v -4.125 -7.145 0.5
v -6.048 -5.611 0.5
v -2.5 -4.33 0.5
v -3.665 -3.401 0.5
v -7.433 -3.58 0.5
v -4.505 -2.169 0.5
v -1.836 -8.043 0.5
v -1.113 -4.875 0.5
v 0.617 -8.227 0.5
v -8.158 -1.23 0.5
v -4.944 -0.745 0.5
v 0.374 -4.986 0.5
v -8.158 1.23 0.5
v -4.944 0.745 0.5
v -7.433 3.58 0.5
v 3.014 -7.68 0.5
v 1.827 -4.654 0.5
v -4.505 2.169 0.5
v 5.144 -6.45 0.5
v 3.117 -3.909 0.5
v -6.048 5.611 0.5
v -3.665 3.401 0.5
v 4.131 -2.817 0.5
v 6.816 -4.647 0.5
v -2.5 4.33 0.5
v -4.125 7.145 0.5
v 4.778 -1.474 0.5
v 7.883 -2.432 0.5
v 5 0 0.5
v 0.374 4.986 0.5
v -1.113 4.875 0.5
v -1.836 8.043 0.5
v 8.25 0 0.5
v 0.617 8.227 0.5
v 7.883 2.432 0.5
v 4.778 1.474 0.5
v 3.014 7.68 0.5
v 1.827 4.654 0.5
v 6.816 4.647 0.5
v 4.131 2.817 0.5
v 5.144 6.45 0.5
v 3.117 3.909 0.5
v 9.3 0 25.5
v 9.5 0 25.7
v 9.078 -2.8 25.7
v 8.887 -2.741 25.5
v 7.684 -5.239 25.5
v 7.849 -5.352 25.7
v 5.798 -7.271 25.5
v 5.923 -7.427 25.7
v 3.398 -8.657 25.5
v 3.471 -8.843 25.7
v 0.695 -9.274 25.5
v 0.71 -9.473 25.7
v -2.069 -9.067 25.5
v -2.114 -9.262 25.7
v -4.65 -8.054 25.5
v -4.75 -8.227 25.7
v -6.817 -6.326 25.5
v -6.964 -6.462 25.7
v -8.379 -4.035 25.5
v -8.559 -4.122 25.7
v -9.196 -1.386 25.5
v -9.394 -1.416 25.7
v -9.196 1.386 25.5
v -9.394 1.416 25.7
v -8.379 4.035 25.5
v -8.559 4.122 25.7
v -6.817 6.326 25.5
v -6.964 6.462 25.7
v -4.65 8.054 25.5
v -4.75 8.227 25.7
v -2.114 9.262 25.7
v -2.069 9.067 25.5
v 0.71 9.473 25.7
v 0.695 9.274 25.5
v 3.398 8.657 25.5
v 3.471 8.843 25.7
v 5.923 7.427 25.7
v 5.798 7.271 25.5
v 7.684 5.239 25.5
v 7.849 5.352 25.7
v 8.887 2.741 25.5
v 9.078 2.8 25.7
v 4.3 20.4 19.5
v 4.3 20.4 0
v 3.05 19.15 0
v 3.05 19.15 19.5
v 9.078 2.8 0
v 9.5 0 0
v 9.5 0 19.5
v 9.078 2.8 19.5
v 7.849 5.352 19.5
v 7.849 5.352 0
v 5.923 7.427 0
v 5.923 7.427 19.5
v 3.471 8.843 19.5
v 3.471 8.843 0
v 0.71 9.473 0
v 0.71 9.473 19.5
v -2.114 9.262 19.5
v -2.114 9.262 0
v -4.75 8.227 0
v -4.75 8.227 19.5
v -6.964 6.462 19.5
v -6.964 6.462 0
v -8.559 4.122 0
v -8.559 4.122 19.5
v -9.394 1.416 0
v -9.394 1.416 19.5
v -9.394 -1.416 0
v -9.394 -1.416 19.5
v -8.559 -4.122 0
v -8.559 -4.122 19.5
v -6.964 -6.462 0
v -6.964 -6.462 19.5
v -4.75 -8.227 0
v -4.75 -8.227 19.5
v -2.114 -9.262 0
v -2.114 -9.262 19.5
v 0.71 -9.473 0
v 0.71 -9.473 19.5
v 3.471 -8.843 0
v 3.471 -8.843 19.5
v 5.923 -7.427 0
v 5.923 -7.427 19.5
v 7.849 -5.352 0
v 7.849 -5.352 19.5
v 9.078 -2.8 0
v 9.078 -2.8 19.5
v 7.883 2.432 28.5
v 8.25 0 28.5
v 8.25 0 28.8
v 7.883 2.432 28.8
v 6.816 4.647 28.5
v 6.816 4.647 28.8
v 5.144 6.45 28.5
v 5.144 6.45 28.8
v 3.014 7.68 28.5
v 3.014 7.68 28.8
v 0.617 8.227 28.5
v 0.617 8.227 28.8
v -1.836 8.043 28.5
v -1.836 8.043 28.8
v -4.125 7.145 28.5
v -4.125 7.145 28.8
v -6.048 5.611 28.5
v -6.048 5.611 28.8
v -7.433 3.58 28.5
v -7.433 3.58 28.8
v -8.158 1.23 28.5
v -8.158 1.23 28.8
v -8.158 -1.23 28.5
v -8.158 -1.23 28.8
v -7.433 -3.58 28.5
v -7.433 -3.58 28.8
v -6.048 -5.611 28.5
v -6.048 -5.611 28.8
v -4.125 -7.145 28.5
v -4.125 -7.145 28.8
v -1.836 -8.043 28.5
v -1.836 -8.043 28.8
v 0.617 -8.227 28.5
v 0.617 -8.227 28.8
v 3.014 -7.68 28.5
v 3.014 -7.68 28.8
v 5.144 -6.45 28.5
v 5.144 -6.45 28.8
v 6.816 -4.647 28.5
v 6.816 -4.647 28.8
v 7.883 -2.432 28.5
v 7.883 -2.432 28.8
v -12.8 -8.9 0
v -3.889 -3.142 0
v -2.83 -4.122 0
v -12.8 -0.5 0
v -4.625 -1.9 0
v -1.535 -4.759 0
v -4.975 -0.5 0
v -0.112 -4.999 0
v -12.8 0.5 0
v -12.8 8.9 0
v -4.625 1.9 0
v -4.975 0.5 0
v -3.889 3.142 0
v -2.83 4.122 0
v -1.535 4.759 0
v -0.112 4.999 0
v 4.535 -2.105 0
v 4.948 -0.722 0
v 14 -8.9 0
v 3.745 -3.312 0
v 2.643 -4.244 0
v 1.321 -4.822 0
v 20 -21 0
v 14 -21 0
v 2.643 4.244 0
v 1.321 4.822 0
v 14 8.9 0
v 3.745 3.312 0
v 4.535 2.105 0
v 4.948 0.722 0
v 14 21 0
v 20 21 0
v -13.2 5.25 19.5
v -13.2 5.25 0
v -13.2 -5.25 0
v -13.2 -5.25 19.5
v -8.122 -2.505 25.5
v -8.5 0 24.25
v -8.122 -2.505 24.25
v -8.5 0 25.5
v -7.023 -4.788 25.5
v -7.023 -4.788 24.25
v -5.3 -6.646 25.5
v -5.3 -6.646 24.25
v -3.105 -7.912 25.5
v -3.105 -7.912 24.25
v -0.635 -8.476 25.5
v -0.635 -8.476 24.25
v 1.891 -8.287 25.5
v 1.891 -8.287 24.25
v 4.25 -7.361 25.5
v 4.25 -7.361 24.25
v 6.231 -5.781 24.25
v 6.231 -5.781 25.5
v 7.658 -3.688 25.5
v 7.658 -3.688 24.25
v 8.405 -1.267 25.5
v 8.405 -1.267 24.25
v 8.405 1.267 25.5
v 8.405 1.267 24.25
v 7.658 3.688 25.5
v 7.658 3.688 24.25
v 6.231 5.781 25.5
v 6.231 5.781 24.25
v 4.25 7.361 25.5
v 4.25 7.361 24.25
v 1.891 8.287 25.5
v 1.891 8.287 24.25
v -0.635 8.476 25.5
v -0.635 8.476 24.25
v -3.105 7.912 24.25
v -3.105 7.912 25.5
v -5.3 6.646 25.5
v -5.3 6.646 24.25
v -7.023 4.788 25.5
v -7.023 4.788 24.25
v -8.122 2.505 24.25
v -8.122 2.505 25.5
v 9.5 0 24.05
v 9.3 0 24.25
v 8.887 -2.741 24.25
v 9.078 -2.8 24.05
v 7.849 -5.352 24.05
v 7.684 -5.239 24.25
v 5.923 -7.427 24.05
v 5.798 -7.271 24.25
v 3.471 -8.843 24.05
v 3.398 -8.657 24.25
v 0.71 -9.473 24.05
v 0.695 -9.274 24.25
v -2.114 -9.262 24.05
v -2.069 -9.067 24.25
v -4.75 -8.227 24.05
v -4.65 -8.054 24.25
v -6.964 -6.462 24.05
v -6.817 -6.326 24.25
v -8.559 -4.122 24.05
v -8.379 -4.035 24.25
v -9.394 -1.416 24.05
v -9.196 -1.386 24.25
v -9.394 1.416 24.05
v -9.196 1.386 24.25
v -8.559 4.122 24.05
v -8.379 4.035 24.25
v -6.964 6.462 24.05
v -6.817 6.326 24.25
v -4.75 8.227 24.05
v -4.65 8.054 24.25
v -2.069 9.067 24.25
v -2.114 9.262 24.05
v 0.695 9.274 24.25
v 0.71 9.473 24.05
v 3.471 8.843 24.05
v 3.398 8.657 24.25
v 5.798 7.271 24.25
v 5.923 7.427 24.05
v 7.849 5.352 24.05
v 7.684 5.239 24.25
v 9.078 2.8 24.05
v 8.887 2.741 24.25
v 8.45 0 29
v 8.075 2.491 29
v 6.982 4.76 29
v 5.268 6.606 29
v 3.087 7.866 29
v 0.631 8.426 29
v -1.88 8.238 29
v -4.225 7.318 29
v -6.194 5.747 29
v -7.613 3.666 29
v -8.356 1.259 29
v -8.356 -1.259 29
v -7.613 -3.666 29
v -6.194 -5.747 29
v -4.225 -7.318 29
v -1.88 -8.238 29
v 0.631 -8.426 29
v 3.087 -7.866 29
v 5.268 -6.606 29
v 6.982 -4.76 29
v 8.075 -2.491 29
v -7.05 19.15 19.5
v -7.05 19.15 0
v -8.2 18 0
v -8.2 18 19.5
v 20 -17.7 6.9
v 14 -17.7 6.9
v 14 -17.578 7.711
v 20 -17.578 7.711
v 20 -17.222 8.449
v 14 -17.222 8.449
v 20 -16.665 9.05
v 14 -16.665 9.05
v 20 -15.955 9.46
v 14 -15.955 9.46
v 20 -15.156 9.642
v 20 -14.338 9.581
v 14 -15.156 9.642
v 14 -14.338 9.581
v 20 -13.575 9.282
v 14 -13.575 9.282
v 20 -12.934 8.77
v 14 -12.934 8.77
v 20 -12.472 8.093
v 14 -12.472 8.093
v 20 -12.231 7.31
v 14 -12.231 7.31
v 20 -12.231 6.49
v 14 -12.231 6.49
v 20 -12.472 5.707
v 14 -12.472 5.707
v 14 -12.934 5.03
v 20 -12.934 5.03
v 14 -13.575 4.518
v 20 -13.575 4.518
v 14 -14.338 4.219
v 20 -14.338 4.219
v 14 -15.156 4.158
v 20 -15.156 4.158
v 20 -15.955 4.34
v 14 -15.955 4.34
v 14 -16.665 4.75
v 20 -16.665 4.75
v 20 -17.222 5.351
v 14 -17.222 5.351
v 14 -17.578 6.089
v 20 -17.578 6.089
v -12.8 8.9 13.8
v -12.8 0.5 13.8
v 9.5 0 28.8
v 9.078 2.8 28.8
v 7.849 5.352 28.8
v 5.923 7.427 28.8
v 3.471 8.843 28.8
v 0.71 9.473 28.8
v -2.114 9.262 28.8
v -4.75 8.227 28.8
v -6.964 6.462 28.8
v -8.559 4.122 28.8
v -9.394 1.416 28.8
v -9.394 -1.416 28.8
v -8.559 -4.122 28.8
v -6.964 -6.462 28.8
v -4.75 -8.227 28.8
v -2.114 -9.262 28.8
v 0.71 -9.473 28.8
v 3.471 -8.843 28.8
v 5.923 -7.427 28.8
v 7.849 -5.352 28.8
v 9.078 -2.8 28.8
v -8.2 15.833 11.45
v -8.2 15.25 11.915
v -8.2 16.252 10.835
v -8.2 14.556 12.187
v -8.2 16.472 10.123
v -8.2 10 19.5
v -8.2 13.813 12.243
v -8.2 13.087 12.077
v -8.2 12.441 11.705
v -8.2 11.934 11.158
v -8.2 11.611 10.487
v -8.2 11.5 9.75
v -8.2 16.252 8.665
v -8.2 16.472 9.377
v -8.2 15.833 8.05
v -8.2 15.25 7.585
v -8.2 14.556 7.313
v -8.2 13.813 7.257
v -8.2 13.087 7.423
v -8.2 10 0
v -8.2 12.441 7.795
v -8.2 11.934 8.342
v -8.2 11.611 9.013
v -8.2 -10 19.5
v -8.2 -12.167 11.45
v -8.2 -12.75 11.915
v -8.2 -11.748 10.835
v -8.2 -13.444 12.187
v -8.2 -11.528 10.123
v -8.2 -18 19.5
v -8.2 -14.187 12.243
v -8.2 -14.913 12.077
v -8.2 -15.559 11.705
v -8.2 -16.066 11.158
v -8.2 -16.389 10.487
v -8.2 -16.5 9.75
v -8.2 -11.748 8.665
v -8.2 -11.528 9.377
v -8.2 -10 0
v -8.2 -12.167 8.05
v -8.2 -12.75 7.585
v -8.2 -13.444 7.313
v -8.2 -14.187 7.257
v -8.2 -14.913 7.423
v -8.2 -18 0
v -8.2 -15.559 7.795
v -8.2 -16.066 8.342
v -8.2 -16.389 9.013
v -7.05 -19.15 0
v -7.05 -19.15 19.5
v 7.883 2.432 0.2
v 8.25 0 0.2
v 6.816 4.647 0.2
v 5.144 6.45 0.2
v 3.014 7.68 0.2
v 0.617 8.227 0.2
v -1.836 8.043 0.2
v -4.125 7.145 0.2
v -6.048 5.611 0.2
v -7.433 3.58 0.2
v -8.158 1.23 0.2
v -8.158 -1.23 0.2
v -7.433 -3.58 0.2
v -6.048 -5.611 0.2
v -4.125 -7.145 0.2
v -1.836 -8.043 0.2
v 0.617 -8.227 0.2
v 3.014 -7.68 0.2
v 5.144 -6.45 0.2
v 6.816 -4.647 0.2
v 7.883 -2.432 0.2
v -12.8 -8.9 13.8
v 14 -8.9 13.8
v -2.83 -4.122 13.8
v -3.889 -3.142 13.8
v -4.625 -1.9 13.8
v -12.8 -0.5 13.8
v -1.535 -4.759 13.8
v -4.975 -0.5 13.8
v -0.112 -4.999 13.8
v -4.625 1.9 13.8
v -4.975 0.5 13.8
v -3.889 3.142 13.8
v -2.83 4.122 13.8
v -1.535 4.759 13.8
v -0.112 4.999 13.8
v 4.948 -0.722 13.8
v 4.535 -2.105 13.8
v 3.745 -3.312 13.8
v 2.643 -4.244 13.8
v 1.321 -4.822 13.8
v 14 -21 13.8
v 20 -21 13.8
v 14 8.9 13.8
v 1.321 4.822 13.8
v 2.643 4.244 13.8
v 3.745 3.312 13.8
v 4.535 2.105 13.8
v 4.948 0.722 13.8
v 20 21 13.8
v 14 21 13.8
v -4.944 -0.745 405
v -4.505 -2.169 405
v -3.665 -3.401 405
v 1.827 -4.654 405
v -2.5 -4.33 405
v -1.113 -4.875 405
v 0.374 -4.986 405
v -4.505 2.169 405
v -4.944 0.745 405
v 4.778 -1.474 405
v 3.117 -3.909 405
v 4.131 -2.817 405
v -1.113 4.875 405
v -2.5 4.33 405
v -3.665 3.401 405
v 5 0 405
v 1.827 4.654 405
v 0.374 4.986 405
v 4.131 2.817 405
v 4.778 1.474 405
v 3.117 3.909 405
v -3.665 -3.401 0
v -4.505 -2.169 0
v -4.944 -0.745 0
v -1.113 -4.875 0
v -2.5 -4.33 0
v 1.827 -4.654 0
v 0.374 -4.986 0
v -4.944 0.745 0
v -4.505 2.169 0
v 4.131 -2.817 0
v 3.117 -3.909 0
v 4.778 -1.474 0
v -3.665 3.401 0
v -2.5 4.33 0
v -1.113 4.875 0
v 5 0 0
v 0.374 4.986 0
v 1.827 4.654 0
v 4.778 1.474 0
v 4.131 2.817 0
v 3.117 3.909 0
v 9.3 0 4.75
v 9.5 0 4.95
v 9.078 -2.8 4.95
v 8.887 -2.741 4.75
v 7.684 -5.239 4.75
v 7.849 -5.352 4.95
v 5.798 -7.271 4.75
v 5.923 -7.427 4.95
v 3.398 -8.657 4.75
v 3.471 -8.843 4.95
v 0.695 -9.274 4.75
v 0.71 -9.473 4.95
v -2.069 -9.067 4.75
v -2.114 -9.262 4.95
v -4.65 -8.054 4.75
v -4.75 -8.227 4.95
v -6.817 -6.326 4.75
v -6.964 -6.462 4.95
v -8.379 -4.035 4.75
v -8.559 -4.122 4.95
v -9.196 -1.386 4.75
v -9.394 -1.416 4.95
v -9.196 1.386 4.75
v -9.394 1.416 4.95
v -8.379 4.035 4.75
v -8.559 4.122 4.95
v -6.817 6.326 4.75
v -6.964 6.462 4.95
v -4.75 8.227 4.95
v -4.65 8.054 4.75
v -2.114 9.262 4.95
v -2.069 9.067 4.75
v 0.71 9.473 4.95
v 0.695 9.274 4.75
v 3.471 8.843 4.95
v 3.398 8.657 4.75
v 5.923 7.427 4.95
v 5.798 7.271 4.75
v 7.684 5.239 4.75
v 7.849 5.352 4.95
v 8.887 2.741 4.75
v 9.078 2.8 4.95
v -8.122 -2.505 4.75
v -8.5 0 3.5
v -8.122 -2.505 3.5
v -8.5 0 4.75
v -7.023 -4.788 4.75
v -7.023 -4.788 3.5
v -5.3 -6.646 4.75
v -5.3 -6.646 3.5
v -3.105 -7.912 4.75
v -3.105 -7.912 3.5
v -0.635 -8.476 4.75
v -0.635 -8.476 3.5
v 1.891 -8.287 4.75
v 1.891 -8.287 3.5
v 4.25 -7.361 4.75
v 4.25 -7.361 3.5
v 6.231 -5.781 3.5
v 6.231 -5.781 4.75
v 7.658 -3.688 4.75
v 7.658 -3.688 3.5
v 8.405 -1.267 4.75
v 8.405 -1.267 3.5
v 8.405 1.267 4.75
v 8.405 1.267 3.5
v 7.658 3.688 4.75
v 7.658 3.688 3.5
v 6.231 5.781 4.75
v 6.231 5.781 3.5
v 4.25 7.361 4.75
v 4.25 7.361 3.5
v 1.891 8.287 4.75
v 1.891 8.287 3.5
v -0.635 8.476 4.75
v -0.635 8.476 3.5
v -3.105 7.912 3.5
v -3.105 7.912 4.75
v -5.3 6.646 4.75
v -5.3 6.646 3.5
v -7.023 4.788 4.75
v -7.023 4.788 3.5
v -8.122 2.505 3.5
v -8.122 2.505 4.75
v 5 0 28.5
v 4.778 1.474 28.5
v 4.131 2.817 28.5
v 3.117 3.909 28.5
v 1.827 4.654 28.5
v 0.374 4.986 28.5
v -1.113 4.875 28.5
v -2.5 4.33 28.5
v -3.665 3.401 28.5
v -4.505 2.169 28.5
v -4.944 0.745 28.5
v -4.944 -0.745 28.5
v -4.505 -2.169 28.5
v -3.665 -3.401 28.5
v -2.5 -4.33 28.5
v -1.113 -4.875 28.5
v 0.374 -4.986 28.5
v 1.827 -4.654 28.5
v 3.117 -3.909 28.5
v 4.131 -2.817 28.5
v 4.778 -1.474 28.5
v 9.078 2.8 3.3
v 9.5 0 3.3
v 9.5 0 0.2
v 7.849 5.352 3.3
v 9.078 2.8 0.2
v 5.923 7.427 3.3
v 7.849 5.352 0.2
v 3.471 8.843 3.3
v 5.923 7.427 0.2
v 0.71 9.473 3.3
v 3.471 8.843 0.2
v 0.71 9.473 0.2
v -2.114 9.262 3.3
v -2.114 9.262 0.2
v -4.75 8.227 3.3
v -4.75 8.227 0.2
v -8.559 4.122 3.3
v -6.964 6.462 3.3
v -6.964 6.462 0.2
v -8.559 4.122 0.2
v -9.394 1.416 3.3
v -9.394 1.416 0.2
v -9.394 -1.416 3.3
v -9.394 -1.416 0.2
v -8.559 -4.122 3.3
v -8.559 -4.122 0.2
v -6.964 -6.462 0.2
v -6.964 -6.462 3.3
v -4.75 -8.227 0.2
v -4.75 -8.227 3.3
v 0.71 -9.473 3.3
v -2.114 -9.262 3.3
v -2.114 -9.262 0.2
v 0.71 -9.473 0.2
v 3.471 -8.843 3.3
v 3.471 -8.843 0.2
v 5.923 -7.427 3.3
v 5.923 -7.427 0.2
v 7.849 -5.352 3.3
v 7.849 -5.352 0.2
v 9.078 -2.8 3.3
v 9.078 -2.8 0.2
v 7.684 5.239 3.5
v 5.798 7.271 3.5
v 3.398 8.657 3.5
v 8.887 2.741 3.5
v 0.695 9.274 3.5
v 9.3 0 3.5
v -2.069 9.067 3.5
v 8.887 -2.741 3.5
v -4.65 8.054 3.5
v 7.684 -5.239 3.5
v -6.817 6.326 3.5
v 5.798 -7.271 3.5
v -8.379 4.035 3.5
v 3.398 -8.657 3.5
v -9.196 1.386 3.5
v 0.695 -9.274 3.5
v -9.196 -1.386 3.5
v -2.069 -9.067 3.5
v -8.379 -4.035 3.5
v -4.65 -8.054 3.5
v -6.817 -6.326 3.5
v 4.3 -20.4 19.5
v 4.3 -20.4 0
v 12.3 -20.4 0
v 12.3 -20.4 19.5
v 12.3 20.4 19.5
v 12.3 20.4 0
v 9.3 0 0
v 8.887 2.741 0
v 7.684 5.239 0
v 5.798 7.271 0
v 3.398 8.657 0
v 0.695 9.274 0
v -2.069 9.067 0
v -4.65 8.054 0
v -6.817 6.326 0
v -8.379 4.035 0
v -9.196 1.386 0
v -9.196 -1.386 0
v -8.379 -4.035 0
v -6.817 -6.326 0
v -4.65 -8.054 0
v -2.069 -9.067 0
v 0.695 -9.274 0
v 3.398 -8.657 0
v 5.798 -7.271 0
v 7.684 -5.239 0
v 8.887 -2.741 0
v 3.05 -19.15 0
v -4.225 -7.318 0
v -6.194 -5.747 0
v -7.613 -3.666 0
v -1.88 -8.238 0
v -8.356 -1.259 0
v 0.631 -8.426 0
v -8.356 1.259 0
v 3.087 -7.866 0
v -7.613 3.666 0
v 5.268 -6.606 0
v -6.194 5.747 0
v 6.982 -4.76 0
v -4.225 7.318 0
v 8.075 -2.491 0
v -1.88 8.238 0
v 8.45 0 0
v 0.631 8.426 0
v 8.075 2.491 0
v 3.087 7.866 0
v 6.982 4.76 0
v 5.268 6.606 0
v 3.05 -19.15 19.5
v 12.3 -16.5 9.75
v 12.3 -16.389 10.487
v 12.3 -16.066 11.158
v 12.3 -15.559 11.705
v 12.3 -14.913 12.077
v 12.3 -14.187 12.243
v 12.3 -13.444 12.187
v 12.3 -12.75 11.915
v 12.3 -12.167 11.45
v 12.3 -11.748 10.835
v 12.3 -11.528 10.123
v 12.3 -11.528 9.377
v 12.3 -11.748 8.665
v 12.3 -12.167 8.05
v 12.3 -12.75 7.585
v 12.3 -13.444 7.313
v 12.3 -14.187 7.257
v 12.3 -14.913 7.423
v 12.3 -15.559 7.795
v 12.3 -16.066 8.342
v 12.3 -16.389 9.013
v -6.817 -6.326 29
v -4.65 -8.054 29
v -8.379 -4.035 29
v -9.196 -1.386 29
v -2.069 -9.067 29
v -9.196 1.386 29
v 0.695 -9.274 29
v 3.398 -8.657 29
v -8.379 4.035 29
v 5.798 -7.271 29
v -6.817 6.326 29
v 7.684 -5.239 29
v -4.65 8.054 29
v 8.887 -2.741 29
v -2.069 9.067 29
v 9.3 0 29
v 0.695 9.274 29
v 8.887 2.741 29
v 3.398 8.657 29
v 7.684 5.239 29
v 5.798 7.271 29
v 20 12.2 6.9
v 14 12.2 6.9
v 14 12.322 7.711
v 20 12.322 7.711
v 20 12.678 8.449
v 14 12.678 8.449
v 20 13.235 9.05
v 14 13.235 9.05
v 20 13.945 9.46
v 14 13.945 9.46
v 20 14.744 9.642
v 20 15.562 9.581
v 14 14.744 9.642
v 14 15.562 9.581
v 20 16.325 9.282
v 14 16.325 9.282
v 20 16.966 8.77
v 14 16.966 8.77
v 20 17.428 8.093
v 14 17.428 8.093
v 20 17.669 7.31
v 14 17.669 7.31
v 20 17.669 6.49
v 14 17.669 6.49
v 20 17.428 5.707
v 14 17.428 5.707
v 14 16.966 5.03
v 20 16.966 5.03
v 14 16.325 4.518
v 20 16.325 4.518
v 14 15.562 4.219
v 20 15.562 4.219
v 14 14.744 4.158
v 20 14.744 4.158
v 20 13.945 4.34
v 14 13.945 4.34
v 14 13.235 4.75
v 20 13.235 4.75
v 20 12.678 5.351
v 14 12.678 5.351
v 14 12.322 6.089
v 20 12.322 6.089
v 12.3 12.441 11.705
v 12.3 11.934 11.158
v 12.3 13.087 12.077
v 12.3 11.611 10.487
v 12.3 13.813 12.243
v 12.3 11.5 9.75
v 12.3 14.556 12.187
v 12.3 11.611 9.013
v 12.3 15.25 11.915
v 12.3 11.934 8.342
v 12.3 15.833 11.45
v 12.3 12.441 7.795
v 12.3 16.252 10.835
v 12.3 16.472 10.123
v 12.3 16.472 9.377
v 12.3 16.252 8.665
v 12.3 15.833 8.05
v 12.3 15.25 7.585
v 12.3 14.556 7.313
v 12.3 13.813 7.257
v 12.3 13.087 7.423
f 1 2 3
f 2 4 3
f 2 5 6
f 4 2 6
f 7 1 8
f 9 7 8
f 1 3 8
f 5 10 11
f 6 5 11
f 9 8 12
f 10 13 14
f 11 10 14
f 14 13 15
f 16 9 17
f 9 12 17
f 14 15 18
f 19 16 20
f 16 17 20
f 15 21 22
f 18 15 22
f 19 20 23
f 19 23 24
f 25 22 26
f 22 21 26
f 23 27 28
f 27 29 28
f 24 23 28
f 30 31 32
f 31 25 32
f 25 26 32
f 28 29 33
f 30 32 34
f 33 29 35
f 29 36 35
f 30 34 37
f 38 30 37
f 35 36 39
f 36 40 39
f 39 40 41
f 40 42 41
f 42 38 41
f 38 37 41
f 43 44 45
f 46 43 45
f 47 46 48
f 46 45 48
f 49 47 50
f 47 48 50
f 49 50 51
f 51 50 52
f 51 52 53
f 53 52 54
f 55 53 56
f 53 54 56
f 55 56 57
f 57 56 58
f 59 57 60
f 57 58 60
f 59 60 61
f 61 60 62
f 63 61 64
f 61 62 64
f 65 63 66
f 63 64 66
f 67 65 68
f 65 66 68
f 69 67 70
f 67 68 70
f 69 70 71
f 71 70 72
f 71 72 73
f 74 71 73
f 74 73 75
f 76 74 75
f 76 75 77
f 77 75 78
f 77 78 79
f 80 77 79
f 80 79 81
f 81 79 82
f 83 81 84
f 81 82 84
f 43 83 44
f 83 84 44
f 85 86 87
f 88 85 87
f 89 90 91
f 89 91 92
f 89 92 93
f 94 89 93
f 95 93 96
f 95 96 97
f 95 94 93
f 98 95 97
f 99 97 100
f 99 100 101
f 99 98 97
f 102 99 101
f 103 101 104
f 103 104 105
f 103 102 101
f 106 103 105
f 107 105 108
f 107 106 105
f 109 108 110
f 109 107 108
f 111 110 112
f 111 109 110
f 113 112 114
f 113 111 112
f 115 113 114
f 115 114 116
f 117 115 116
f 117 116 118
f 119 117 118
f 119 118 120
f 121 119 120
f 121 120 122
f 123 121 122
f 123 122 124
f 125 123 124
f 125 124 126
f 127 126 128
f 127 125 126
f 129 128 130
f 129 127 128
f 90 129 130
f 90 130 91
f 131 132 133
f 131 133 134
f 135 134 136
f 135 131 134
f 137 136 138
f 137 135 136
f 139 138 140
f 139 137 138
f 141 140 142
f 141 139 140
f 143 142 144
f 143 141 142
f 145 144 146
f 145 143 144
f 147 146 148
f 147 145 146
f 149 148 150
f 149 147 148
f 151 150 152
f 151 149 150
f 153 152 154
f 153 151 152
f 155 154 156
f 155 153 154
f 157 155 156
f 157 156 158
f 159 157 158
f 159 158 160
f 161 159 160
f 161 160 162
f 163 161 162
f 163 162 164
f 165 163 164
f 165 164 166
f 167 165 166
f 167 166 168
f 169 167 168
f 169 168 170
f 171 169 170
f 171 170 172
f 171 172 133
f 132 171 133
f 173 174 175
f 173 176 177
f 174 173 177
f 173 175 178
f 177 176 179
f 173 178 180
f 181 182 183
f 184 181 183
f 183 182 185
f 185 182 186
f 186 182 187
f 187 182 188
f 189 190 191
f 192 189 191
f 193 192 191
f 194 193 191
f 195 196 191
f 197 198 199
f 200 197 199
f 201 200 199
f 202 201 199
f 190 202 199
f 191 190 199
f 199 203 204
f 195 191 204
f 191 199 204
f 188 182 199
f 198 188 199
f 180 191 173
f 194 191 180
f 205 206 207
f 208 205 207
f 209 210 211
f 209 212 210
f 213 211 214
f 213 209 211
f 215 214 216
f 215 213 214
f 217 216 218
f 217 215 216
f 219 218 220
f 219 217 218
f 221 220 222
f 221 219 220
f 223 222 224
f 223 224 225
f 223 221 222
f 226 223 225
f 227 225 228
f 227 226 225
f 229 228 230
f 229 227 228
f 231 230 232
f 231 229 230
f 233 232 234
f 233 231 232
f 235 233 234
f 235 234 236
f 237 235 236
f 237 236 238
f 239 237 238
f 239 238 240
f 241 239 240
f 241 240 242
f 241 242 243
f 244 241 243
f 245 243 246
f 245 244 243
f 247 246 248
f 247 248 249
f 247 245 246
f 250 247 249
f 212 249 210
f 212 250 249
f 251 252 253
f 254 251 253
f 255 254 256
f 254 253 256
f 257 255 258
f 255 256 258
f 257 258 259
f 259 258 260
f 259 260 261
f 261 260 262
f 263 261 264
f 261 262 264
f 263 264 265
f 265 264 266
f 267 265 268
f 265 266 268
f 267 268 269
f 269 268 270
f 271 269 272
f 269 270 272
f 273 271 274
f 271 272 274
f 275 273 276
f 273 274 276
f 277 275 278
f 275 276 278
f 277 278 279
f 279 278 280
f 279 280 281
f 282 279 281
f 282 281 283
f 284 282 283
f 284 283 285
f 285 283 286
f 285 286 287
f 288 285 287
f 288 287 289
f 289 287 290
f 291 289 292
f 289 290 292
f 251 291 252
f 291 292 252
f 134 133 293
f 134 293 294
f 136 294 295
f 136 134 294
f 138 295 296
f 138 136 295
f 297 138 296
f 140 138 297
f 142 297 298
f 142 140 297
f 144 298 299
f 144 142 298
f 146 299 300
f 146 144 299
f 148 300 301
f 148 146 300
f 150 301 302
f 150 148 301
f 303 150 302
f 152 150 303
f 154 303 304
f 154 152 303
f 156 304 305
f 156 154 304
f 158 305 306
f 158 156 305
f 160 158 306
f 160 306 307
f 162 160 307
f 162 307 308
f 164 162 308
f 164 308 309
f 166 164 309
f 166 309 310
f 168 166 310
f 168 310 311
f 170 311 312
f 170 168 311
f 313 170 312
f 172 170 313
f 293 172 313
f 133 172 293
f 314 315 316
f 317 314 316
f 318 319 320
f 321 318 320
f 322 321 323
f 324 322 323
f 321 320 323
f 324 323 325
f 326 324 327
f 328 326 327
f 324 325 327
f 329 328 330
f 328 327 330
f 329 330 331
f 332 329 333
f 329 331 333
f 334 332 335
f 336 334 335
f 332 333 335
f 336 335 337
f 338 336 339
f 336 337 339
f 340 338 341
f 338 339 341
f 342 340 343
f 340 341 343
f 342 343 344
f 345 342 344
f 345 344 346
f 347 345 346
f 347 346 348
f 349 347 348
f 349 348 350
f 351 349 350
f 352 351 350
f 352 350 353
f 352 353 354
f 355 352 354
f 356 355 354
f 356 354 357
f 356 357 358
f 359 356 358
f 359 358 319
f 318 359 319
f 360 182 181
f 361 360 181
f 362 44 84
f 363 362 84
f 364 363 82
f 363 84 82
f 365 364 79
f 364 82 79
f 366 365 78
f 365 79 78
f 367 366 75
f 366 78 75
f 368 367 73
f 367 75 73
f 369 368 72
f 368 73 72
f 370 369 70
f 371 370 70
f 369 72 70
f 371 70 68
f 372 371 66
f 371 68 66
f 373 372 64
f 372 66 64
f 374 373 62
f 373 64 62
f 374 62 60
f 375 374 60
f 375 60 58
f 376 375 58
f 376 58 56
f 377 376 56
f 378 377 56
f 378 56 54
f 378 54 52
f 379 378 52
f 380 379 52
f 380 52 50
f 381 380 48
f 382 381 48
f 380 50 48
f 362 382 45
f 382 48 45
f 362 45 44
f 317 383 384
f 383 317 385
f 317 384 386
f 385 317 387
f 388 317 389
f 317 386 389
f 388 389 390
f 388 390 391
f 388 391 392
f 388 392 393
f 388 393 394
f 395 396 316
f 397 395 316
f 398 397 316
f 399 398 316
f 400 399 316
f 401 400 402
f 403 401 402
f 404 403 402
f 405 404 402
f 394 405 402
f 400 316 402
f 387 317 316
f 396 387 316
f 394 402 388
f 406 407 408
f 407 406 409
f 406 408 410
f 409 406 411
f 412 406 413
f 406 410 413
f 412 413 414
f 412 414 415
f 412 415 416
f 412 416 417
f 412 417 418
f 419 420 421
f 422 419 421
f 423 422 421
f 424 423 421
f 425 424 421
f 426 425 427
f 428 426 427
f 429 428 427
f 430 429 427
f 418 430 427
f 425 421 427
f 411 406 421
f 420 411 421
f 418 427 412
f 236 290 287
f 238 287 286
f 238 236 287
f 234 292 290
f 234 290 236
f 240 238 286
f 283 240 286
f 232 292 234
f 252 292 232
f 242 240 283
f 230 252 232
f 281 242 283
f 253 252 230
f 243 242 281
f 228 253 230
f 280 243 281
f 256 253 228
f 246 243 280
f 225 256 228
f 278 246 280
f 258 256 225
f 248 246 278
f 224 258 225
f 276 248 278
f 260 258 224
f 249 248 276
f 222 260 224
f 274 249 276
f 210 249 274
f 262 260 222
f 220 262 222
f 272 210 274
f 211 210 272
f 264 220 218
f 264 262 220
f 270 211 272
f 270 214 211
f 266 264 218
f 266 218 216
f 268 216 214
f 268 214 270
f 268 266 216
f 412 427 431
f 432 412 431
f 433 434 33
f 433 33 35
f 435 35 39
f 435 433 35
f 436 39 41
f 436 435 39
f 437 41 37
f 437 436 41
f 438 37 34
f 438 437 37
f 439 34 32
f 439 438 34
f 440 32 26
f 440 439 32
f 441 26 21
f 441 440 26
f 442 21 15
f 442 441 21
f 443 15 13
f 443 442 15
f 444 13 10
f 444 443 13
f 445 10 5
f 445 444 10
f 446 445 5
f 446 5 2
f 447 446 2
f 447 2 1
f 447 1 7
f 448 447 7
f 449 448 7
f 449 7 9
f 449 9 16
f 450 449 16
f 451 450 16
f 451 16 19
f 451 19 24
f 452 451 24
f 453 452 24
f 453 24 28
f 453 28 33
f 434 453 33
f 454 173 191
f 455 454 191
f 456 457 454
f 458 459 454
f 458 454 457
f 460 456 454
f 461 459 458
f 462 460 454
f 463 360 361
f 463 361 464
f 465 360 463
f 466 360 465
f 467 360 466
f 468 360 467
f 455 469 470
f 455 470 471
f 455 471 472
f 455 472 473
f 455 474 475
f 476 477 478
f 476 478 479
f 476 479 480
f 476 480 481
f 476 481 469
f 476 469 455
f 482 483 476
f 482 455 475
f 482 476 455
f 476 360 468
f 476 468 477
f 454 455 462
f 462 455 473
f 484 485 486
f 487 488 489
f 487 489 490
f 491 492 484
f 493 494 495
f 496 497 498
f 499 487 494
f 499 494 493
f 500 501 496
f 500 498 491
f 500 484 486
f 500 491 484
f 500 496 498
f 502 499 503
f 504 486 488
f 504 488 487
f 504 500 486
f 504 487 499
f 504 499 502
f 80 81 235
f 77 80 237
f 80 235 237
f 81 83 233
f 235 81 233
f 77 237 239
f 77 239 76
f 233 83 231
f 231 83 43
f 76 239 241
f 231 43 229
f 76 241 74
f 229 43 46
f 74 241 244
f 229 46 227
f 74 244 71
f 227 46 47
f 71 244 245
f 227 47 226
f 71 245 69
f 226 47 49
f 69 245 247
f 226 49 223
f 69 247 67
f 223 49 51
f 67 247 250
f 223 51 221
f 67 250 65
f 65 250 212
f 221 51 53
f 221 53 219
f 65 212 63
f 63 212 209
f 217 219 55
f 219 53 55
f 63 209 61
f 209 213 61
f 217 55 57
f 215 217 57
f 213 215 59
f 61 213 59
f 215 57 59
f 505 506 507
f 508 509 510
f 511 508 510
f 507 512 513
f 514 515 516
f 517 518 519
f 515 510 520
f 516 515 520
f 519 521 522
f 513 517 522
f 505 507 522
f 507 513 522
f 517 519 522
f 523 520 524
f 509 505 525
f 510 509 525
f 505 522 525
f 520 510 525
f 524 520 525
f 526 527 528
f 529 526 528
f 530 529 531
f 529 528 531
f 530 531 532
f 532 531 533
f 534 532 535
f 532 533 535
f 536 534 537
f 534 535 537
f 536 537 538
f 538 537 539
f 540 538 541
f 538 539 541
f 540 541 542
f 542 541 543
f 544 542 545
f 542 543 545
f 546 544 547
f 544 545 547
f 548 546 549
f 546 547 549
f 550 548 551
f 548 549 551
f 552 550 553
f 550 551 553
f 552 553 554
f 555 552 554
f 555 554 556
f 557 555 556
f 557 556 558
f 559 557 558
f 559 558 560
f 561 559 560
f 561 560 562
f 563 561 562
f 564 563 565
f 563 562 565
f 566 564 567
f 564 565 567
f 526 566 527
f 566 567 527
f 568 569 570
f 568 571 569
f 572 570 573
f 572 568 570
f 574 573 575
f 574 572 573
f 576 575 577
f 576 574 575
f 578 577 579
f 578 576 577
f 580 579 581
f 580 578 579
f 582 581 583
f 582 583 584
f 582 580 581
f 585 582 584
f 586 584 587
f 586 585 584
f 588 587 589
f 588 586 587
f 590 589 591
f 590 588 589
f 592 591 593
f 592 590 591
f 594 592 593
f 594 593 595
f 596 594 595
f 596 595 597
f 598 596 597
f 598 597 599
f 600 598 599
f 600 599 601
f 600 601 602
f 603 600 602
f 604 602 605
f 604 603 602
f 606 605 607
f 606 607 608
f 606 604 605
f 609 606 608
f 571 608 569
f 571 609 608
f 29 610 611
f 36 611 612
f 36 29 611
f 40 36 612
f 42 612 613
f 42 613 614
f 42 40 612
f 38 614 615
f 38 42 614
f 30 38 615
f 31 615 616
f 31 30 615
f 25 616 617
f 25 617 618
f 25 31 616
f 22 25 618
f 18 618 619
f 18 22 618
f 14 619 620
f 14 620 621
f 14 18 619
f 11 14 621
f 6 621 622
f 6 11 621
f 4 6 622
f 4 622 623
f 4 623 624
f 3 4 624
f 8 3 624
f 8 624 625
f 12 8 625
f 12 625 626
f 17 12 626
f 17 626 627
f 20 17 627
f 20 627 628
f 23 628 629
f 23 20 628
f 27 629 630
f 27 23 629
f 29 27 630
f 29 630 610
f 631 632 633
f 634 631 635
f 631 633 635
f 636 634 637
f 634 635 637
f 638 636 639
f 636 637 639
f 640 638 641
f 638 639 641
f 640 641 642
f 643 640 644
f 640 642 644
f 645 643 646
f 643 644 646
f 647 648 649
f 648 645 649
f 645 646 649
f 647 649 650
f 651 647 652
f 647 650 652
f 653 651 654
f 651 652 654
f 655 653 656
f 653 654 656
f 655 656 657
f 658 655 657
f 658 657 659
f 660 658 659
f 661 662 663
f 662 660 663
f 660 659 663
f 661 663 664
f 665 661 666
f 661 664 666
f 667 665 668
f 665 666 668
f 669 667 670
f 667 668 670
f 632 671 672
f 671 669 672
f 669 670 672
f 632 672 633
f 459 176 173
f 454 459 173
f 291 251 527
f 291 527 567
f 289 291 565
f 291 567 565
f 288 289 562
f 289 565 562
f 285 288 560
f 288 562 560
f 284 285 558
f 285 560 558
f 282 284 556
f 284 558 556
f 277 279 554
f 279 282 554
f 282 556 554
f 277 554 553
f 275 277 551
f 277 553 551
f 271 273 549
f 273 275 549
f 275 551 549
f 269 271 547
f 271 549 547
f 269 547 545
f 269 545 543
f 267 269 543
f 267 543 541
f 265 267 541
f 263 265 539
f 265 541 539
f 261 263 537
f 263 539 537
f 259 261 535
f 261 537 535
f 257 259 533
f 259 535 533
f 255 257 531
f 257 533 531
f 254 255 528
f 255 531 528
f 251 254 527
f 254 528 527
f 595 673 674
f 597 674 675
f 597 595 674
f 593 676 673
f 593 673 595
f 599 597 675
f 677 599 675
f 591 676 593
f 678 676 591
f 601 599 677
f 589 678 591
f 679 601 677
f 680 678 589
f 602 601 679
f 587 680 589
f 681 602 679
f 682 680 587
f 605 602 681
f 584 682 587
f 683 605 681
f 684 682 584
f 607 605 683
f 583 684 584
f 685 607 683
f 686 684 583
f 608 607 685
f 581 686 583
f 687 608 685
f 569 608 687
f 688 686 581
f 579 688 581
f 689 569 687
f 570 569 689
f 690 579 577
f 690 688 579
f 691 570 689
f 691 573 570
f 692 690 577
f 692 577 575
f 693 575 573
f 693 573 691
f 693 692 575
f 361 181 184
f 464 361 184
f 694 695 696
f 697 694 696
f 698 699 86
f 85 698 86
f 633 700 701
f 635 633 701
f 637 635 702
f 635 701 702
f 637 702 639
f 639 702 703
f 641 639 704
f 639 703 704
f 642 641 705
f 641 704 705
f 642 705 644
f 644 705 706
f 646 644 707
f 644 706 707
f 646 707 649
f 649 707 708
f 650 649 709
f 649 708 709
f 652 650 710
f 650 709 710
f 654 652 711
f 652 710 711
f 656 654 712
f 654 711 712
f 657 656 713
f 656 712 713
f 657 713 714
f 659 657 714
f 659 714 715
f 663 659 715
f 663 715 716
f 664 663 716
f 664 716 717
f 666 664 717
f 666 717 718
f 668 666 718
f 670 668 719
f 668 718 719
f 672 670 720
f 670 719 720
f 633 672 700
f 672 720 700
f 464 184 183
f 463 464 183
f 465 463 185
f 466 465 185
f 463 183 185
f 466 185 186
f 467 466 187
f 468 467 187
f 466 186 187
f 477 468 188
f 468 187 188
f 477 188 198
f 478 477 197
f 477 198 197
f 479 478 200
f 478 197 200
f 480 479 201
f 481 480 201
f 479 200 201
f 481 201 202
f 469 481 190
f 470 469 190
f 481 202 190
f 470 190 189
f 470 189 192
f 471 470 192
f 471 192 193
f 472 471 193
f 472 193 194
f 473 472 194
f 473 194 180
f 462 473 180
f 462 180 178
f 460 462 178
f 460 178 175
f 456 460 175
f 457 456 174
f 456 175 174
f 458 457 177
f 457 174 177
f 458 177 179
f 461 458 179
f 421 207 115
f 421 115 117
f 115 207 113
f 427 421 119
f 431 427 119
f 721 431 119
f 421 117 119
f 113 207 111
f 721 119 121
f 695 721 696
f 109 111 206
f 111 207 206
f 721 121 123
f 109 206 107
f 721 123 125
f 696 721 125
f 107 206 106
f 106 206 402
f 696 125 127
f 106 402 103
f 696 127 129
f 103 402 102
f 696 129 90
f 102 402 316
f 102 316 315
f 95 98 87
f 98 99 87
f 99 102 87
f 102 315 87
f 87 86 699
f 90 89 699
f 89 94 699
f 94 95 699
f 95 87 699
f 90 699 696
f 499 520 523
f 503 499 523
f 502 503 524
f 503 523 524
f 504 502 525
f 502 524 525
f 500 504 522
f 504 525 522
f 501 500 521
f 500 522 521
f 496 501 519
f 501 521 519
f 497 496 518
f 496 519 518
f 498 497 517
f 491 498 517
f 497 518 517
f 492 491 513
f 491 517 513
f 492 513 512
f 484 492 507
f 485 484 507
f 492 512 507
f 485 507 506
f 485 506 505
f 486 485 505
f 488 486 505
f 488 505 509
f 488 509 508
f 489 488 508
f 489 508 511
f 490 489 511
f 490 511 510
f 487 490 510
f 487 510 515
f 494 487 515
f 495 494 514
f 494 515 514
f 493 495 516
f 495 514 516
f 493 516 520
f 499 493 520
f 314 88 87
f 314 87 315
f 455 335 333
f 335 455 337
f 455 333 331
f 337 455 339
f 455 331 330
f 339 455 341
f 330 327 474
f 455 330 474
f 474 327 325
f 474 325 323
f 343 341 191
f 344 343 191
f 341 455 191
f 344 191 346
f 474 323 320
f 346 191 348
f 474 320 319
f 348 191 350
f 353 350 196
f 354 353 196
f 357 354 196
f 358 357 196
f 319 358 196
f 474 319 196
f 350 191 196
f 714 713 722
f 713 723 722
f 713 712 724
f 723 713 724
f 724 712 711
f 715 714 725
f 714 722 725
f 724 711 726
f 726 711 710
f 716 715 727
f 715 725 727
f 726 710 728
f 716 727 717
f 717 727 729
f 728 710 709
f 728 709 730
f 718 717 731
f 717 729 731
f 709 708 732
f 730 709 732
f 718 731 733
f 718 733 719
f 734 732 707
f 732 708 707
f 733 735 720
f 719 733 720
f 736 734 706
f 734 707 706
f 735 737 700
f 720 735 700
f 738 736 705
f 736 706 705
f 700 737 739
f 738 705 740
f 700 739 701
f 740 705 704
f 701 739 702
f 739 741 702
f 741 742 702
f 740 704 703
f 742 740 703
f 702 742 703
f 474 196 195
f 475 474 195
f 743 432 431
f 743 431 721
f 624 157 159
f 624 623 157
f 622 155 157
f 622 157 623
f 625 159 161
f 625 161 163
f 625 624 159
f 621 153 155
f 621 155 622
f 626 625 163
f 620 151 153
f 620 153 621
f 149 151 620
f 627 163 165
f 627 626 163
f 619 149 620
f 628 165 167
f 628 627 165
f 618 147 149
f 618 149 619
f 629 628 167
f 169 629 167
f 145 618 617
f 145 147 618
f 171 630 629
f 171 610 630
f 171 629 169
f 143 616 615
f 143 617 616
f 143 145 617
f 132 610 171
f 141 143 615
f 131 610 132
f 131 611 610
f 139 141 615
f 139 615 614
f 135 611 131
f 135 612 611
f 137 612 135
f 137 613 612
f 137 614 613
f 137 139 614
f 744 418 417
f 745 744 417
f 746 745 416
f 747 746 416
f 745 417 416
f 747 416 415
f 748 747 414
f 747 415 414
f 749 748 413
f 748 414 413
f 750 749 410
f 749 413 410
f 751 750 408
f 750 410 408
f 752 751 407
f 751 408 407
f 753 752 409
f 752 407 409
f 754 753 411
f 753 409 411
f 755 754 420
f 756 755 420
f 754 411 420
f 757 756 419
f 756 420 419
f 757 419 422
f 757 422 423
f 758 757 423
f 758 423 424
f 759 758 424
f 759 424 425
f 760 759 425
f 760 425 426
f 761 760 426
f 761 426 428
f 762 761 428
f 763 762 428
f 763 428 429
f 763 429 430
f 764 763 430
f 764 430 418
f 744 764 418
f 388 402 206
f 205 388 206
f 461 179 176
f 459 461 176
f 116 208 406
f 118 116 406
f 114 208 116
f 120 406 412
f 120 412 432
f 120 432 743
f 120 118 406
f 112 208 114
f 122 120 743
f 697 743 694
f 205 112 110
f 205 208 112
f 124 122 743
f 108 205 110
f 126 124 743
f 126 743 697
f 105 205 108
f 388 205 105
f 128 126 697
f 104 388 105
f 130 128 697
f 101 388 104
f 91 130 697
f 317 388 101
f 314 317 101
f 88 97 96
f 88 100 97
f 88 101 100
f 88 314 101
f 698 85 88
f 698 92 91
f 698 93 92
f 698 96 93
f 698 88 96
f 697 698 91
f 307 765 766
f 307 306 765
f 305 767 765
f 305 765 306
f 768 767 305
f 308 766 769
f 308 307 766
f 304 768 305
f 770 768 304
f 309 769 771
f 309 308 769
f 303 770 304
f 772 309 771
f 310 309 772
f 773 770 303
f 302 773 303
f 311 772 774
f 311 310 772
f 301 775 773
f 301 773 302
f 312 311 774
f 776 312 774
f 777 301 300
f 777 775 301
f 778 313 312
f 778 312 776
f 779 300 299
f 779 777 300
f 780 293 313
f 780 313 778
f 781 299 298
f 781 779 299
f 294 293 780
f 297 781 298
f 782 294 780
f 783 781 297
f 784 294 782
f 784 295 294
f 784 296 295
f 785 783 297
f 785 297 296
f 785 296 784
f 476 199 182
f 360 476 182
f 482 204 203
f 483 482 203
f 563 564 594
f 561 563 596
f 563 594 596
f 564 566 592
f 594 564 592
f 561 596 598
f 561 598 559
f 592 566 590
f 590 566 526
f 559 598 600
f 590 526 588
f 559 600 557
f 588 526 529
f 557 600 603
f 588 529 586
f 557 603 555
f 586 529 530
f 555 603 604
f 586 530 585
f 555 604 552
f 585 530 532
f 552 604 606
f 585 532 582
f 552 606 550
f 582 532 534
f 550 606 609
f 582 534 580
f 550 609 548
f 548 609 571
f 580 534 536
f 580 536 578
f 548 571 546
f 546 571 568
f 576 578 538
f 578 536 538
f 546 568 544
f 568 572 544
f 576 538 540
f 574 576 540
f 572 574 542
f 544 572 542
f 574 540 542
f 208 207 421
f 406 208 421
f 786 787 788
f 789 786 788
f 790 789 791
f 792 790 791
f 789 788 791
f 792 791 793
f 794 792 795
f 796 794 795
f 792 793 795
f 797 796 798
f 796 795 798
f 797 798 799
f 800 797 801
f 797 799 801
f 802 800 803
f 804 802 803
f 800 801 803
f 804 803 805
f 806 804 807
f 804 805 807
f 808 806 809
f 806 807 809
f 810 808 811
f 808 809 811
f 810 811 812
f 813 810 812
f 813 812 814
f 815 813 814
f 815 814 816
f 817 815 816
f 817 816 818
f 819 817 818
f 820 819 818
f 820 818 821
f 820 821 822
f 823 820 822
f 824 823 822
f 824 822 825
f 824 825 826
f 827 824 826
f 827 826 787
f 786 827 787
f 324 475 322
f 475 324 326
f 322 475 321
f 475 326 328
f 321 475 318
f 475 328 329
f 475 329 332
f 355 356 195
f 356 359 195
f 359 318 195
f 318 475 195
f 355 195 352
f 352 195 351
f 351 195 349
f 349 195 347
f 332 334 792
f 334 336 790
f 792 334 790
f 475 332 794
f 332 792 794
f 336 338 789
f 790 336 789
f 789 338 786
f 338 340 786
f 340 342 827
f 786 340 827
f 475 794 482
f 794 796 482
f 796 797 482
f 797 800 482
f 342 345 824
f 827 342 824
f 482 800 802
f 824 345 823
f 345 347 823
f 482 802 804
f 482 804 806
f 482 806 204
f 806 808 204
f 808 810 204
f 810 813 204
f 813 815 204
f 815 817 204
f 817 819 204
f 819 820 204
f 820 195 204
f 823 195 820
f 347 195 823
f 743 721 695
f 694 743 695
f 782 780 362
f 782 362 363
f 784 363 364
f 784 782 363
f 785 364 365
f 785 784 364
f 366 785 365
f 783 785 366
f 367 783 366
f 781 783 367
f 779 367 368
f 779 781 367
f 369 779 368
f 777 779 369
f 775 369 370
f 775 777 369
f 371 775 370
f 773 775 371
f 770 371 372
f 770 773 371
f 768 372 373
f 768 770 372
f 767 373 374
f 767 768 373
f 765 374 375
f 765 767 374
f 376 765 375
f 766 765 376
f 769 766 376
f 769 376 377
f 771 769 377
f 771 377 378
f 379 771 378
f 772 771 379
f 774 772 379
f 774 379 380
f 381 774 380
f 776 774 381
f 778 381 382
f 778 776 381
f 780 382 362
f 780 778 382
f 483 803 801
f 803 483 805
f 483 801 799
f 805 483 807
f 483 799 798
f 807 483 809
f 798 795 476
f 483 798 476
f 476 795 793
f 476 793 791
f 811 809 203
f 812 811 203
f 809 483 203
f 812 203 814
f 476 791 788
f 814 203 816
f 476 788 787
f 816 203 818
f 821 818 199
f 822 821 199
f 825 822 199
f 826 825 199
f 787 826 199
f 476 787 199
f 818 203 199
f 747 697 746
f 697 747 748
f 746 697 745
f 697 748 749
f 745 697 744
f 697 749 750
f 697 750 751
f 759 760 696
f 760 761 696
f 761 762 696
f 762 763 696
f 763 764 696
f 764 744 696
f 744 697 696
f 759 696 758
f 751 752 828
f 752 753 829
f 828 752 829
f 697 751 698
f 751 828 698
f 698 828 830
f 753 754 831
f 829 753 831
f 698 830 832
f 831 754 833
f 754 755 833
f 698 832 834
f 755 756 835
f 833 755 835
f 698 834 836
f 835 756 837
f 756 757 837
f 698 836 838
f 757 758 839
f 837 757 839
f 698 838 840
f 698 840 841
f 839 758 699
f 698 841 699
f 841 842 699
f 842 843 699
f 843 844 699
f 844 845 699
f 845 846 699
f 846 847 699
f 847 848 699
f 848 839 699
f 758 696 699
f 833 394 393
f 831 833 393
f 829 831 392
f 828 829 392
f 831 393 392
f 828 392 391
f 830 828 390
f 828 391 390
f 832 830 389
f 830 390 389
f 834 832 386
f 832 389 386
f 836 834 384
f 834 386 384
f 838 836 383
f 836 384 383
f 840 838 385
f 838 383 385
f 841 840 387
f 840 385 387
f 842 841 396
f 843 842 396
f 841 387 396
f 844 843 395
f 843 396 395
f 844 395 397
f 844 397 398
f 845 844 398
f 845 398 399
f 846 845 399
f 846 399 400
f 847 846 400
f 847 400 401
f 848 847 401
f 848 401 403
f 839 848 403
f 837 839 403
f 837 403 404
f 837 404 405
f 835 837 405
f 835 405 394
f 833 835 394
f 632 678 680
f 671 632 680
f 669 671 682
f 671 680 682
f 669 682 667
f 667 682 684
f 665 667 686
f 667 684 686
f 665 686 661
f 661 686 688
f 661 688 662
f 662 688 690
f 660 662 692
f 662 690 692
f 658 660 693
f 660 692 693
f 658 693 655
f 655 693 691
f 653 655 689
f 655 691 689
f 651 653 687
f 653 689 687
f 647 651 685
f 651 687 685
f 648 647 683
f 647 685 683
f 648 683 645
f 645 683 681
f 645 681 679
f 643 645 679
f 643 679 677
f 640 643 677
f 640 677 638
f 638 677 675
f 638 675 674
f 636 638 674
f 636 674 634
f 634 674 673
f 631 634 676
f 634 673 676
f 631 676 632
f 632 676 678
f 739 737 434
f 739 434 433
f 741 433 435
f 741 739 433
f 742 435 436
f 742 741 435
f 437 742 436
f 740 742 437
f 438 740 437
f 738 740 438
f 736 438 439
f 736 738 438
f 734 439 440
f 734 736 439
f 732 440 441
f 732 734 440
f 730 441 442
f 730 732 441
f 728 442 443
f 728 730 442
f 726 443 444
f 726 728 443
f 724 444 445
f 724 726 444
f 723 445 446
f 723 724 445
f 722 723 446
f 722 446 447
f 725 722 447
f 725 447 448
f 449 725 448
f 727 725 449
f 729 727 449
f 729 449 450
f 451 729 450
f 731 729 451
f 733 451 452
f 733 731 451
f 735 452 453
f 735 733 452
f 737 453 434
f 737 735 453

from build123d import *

# Parameters (mm, degrees)
F1_DEPTH  = 13.8
F2_R      = 2.75
F3_DEPTH  = 6.001
F4_R      = 9.5
F5_DEPTH  = 19.5
F4_R_2    = 8.25
F6_DEPTH  = 29
F7_START  = 0.5
F4_R_3    = 5
F7_DEPTH  = 28
F8_W      = 1
F8_H      = 1.25
F10_SIZE  = 0.2
F11_R     = 2.5
F12_DEPTH = 28.201
F13_DEPTH = 405


with BuildPart() as f1:
    # F0 (on Top) → F1 (new body)
    with BuildSketch(Plane.XY):
        with BuildLine():
            Line((20, -21), (20, 21))
            Line((20, 21), (14, 21))
            Line((14, 21), (14, 8.9))
            Line((14, 8.9), (-12.8, 8.9))
            Line((-12.8, 8.9), (-12.8, 0.5))
            Line((-12.8, 0.5), (-4.9749371855, 0.5))
            ThreePointArc((-4.9749371855, 0.5), (5, 0), (-4.9749371855, -0.5))
            Line((-4.9749371855, -0.5), (-12.8, -0.5))
            Line((-12.8, -0.5), (-12.8, -8.9))
            Line((-12.8, -8.9), (14, -8.9))
            Line((14, -8.9), (14, -21))
            Line((14, -21), (20, -21))
        make_face()
    extrude(amount=F1_DEPTH)

    # F2 (on face) → F3 (cut, through all)
    with BuildSketch(Plane(origin=(14, 0, 0), x_dir=(0, -1, 0), z_dir=(-1, 0, 0))):
        with Locations((-14.95, 6.9)):
            Circle(F2_R)
        with Locations((14.95, 6.9)):
            Circle(F2_R)
    extrude(amount=-F3_DEPTH, mode=Mode.SUBTRACT)


with BuildPart() as f5:
    # F4 (on Top) → F5 (new body)
    with BuildSketch(Plane.XY):
        Polygon((12.3, -20.4), (12.3, 20.4), (4.3, 20.4), (3.05, 19.15), (-7.05, 19.15), (-8.2, 18), (-8.2, 10), (-13.2, 5.25), (-13.2, -5.25), (-8.2, -10), (-8.2, -18), (-7.05, -19.15), (3.05, -19.15), (4.3, -20.4), align=None)
        Circle(F4_R, mode=Mode.SUBTRACT)
    extrude(amount=F5_DEPTH)

    # F11 (on face) → F12 (cut, through all)
    with BuildSketch(Plane(origin=(-8.2, 0, 0), x_dir=(0, -1, 0), z_dir=(-1, 0, 0))):
        with Locations((14, 9.75)):
            Circle(F11_R)
        with Locations((-14, 9.75)):
            Circle(F11_R)
    extrude(amount=-F12_DEPTH, mode=Mode.SUBTRACT)


with BuildPart() as f6:
    # F4 (on Top) → F6 (new body)
    with BuildSketch(Plane.XY):
        Circle(F4_R)
        Circle(F4_R_2, mode=Mode.SUBTRACT)
    extrude(amount=F6_DEPTH)

    # F4 (on Top) → F7 (join)
    with BuildSketch(Plane.XY.offset(F7_START)):
        Circle(F4_R_2)
        Circle(F4_R_3, mode=Mode.SUBTRACT)
    extrude(amount=F7_DEPTH)

    # F8 (on Front) → F9 (revolve, cut)
    with BuildSketch(Plane.XZ):
        with Locations((-9, 24.875)):
            Rectangle(F8_W, F8_H)
        with Locations((-9, 4.125)):
            Rectangle(F8_W, F8_H)
    revolve(axis=Axis((0, 0, 7.25), (0, 0, 1)), mode=Mode.SUBTRACT)

    # F10
    f10_edges = [f6.edges().sort_by_distance(p)[0] for p in [
        (-9.5, 0, 29),
        (-8.25, 0, 29),
        (-9.5, 0, 24.25),
        (-9.5, 0, 25.5),
        (-9.5, 0, 3.5),
        (-9.5, 0, 4.75),
        (-9.5, 0, 0),
        (-8.25, 0, 0),
    ]]
    chamfer(f10_edges, length=F10_SIZE)


with BuildPart() as f13:
    # F4 (on Top) → F13 (new body)
    with BuildSketch(Plane.XY):
        Circle(F4_R_3)
    extrude(amount=F13_DEPTH)


solid = Compound([f1.part, f5.part, f6.part, f13.part])
